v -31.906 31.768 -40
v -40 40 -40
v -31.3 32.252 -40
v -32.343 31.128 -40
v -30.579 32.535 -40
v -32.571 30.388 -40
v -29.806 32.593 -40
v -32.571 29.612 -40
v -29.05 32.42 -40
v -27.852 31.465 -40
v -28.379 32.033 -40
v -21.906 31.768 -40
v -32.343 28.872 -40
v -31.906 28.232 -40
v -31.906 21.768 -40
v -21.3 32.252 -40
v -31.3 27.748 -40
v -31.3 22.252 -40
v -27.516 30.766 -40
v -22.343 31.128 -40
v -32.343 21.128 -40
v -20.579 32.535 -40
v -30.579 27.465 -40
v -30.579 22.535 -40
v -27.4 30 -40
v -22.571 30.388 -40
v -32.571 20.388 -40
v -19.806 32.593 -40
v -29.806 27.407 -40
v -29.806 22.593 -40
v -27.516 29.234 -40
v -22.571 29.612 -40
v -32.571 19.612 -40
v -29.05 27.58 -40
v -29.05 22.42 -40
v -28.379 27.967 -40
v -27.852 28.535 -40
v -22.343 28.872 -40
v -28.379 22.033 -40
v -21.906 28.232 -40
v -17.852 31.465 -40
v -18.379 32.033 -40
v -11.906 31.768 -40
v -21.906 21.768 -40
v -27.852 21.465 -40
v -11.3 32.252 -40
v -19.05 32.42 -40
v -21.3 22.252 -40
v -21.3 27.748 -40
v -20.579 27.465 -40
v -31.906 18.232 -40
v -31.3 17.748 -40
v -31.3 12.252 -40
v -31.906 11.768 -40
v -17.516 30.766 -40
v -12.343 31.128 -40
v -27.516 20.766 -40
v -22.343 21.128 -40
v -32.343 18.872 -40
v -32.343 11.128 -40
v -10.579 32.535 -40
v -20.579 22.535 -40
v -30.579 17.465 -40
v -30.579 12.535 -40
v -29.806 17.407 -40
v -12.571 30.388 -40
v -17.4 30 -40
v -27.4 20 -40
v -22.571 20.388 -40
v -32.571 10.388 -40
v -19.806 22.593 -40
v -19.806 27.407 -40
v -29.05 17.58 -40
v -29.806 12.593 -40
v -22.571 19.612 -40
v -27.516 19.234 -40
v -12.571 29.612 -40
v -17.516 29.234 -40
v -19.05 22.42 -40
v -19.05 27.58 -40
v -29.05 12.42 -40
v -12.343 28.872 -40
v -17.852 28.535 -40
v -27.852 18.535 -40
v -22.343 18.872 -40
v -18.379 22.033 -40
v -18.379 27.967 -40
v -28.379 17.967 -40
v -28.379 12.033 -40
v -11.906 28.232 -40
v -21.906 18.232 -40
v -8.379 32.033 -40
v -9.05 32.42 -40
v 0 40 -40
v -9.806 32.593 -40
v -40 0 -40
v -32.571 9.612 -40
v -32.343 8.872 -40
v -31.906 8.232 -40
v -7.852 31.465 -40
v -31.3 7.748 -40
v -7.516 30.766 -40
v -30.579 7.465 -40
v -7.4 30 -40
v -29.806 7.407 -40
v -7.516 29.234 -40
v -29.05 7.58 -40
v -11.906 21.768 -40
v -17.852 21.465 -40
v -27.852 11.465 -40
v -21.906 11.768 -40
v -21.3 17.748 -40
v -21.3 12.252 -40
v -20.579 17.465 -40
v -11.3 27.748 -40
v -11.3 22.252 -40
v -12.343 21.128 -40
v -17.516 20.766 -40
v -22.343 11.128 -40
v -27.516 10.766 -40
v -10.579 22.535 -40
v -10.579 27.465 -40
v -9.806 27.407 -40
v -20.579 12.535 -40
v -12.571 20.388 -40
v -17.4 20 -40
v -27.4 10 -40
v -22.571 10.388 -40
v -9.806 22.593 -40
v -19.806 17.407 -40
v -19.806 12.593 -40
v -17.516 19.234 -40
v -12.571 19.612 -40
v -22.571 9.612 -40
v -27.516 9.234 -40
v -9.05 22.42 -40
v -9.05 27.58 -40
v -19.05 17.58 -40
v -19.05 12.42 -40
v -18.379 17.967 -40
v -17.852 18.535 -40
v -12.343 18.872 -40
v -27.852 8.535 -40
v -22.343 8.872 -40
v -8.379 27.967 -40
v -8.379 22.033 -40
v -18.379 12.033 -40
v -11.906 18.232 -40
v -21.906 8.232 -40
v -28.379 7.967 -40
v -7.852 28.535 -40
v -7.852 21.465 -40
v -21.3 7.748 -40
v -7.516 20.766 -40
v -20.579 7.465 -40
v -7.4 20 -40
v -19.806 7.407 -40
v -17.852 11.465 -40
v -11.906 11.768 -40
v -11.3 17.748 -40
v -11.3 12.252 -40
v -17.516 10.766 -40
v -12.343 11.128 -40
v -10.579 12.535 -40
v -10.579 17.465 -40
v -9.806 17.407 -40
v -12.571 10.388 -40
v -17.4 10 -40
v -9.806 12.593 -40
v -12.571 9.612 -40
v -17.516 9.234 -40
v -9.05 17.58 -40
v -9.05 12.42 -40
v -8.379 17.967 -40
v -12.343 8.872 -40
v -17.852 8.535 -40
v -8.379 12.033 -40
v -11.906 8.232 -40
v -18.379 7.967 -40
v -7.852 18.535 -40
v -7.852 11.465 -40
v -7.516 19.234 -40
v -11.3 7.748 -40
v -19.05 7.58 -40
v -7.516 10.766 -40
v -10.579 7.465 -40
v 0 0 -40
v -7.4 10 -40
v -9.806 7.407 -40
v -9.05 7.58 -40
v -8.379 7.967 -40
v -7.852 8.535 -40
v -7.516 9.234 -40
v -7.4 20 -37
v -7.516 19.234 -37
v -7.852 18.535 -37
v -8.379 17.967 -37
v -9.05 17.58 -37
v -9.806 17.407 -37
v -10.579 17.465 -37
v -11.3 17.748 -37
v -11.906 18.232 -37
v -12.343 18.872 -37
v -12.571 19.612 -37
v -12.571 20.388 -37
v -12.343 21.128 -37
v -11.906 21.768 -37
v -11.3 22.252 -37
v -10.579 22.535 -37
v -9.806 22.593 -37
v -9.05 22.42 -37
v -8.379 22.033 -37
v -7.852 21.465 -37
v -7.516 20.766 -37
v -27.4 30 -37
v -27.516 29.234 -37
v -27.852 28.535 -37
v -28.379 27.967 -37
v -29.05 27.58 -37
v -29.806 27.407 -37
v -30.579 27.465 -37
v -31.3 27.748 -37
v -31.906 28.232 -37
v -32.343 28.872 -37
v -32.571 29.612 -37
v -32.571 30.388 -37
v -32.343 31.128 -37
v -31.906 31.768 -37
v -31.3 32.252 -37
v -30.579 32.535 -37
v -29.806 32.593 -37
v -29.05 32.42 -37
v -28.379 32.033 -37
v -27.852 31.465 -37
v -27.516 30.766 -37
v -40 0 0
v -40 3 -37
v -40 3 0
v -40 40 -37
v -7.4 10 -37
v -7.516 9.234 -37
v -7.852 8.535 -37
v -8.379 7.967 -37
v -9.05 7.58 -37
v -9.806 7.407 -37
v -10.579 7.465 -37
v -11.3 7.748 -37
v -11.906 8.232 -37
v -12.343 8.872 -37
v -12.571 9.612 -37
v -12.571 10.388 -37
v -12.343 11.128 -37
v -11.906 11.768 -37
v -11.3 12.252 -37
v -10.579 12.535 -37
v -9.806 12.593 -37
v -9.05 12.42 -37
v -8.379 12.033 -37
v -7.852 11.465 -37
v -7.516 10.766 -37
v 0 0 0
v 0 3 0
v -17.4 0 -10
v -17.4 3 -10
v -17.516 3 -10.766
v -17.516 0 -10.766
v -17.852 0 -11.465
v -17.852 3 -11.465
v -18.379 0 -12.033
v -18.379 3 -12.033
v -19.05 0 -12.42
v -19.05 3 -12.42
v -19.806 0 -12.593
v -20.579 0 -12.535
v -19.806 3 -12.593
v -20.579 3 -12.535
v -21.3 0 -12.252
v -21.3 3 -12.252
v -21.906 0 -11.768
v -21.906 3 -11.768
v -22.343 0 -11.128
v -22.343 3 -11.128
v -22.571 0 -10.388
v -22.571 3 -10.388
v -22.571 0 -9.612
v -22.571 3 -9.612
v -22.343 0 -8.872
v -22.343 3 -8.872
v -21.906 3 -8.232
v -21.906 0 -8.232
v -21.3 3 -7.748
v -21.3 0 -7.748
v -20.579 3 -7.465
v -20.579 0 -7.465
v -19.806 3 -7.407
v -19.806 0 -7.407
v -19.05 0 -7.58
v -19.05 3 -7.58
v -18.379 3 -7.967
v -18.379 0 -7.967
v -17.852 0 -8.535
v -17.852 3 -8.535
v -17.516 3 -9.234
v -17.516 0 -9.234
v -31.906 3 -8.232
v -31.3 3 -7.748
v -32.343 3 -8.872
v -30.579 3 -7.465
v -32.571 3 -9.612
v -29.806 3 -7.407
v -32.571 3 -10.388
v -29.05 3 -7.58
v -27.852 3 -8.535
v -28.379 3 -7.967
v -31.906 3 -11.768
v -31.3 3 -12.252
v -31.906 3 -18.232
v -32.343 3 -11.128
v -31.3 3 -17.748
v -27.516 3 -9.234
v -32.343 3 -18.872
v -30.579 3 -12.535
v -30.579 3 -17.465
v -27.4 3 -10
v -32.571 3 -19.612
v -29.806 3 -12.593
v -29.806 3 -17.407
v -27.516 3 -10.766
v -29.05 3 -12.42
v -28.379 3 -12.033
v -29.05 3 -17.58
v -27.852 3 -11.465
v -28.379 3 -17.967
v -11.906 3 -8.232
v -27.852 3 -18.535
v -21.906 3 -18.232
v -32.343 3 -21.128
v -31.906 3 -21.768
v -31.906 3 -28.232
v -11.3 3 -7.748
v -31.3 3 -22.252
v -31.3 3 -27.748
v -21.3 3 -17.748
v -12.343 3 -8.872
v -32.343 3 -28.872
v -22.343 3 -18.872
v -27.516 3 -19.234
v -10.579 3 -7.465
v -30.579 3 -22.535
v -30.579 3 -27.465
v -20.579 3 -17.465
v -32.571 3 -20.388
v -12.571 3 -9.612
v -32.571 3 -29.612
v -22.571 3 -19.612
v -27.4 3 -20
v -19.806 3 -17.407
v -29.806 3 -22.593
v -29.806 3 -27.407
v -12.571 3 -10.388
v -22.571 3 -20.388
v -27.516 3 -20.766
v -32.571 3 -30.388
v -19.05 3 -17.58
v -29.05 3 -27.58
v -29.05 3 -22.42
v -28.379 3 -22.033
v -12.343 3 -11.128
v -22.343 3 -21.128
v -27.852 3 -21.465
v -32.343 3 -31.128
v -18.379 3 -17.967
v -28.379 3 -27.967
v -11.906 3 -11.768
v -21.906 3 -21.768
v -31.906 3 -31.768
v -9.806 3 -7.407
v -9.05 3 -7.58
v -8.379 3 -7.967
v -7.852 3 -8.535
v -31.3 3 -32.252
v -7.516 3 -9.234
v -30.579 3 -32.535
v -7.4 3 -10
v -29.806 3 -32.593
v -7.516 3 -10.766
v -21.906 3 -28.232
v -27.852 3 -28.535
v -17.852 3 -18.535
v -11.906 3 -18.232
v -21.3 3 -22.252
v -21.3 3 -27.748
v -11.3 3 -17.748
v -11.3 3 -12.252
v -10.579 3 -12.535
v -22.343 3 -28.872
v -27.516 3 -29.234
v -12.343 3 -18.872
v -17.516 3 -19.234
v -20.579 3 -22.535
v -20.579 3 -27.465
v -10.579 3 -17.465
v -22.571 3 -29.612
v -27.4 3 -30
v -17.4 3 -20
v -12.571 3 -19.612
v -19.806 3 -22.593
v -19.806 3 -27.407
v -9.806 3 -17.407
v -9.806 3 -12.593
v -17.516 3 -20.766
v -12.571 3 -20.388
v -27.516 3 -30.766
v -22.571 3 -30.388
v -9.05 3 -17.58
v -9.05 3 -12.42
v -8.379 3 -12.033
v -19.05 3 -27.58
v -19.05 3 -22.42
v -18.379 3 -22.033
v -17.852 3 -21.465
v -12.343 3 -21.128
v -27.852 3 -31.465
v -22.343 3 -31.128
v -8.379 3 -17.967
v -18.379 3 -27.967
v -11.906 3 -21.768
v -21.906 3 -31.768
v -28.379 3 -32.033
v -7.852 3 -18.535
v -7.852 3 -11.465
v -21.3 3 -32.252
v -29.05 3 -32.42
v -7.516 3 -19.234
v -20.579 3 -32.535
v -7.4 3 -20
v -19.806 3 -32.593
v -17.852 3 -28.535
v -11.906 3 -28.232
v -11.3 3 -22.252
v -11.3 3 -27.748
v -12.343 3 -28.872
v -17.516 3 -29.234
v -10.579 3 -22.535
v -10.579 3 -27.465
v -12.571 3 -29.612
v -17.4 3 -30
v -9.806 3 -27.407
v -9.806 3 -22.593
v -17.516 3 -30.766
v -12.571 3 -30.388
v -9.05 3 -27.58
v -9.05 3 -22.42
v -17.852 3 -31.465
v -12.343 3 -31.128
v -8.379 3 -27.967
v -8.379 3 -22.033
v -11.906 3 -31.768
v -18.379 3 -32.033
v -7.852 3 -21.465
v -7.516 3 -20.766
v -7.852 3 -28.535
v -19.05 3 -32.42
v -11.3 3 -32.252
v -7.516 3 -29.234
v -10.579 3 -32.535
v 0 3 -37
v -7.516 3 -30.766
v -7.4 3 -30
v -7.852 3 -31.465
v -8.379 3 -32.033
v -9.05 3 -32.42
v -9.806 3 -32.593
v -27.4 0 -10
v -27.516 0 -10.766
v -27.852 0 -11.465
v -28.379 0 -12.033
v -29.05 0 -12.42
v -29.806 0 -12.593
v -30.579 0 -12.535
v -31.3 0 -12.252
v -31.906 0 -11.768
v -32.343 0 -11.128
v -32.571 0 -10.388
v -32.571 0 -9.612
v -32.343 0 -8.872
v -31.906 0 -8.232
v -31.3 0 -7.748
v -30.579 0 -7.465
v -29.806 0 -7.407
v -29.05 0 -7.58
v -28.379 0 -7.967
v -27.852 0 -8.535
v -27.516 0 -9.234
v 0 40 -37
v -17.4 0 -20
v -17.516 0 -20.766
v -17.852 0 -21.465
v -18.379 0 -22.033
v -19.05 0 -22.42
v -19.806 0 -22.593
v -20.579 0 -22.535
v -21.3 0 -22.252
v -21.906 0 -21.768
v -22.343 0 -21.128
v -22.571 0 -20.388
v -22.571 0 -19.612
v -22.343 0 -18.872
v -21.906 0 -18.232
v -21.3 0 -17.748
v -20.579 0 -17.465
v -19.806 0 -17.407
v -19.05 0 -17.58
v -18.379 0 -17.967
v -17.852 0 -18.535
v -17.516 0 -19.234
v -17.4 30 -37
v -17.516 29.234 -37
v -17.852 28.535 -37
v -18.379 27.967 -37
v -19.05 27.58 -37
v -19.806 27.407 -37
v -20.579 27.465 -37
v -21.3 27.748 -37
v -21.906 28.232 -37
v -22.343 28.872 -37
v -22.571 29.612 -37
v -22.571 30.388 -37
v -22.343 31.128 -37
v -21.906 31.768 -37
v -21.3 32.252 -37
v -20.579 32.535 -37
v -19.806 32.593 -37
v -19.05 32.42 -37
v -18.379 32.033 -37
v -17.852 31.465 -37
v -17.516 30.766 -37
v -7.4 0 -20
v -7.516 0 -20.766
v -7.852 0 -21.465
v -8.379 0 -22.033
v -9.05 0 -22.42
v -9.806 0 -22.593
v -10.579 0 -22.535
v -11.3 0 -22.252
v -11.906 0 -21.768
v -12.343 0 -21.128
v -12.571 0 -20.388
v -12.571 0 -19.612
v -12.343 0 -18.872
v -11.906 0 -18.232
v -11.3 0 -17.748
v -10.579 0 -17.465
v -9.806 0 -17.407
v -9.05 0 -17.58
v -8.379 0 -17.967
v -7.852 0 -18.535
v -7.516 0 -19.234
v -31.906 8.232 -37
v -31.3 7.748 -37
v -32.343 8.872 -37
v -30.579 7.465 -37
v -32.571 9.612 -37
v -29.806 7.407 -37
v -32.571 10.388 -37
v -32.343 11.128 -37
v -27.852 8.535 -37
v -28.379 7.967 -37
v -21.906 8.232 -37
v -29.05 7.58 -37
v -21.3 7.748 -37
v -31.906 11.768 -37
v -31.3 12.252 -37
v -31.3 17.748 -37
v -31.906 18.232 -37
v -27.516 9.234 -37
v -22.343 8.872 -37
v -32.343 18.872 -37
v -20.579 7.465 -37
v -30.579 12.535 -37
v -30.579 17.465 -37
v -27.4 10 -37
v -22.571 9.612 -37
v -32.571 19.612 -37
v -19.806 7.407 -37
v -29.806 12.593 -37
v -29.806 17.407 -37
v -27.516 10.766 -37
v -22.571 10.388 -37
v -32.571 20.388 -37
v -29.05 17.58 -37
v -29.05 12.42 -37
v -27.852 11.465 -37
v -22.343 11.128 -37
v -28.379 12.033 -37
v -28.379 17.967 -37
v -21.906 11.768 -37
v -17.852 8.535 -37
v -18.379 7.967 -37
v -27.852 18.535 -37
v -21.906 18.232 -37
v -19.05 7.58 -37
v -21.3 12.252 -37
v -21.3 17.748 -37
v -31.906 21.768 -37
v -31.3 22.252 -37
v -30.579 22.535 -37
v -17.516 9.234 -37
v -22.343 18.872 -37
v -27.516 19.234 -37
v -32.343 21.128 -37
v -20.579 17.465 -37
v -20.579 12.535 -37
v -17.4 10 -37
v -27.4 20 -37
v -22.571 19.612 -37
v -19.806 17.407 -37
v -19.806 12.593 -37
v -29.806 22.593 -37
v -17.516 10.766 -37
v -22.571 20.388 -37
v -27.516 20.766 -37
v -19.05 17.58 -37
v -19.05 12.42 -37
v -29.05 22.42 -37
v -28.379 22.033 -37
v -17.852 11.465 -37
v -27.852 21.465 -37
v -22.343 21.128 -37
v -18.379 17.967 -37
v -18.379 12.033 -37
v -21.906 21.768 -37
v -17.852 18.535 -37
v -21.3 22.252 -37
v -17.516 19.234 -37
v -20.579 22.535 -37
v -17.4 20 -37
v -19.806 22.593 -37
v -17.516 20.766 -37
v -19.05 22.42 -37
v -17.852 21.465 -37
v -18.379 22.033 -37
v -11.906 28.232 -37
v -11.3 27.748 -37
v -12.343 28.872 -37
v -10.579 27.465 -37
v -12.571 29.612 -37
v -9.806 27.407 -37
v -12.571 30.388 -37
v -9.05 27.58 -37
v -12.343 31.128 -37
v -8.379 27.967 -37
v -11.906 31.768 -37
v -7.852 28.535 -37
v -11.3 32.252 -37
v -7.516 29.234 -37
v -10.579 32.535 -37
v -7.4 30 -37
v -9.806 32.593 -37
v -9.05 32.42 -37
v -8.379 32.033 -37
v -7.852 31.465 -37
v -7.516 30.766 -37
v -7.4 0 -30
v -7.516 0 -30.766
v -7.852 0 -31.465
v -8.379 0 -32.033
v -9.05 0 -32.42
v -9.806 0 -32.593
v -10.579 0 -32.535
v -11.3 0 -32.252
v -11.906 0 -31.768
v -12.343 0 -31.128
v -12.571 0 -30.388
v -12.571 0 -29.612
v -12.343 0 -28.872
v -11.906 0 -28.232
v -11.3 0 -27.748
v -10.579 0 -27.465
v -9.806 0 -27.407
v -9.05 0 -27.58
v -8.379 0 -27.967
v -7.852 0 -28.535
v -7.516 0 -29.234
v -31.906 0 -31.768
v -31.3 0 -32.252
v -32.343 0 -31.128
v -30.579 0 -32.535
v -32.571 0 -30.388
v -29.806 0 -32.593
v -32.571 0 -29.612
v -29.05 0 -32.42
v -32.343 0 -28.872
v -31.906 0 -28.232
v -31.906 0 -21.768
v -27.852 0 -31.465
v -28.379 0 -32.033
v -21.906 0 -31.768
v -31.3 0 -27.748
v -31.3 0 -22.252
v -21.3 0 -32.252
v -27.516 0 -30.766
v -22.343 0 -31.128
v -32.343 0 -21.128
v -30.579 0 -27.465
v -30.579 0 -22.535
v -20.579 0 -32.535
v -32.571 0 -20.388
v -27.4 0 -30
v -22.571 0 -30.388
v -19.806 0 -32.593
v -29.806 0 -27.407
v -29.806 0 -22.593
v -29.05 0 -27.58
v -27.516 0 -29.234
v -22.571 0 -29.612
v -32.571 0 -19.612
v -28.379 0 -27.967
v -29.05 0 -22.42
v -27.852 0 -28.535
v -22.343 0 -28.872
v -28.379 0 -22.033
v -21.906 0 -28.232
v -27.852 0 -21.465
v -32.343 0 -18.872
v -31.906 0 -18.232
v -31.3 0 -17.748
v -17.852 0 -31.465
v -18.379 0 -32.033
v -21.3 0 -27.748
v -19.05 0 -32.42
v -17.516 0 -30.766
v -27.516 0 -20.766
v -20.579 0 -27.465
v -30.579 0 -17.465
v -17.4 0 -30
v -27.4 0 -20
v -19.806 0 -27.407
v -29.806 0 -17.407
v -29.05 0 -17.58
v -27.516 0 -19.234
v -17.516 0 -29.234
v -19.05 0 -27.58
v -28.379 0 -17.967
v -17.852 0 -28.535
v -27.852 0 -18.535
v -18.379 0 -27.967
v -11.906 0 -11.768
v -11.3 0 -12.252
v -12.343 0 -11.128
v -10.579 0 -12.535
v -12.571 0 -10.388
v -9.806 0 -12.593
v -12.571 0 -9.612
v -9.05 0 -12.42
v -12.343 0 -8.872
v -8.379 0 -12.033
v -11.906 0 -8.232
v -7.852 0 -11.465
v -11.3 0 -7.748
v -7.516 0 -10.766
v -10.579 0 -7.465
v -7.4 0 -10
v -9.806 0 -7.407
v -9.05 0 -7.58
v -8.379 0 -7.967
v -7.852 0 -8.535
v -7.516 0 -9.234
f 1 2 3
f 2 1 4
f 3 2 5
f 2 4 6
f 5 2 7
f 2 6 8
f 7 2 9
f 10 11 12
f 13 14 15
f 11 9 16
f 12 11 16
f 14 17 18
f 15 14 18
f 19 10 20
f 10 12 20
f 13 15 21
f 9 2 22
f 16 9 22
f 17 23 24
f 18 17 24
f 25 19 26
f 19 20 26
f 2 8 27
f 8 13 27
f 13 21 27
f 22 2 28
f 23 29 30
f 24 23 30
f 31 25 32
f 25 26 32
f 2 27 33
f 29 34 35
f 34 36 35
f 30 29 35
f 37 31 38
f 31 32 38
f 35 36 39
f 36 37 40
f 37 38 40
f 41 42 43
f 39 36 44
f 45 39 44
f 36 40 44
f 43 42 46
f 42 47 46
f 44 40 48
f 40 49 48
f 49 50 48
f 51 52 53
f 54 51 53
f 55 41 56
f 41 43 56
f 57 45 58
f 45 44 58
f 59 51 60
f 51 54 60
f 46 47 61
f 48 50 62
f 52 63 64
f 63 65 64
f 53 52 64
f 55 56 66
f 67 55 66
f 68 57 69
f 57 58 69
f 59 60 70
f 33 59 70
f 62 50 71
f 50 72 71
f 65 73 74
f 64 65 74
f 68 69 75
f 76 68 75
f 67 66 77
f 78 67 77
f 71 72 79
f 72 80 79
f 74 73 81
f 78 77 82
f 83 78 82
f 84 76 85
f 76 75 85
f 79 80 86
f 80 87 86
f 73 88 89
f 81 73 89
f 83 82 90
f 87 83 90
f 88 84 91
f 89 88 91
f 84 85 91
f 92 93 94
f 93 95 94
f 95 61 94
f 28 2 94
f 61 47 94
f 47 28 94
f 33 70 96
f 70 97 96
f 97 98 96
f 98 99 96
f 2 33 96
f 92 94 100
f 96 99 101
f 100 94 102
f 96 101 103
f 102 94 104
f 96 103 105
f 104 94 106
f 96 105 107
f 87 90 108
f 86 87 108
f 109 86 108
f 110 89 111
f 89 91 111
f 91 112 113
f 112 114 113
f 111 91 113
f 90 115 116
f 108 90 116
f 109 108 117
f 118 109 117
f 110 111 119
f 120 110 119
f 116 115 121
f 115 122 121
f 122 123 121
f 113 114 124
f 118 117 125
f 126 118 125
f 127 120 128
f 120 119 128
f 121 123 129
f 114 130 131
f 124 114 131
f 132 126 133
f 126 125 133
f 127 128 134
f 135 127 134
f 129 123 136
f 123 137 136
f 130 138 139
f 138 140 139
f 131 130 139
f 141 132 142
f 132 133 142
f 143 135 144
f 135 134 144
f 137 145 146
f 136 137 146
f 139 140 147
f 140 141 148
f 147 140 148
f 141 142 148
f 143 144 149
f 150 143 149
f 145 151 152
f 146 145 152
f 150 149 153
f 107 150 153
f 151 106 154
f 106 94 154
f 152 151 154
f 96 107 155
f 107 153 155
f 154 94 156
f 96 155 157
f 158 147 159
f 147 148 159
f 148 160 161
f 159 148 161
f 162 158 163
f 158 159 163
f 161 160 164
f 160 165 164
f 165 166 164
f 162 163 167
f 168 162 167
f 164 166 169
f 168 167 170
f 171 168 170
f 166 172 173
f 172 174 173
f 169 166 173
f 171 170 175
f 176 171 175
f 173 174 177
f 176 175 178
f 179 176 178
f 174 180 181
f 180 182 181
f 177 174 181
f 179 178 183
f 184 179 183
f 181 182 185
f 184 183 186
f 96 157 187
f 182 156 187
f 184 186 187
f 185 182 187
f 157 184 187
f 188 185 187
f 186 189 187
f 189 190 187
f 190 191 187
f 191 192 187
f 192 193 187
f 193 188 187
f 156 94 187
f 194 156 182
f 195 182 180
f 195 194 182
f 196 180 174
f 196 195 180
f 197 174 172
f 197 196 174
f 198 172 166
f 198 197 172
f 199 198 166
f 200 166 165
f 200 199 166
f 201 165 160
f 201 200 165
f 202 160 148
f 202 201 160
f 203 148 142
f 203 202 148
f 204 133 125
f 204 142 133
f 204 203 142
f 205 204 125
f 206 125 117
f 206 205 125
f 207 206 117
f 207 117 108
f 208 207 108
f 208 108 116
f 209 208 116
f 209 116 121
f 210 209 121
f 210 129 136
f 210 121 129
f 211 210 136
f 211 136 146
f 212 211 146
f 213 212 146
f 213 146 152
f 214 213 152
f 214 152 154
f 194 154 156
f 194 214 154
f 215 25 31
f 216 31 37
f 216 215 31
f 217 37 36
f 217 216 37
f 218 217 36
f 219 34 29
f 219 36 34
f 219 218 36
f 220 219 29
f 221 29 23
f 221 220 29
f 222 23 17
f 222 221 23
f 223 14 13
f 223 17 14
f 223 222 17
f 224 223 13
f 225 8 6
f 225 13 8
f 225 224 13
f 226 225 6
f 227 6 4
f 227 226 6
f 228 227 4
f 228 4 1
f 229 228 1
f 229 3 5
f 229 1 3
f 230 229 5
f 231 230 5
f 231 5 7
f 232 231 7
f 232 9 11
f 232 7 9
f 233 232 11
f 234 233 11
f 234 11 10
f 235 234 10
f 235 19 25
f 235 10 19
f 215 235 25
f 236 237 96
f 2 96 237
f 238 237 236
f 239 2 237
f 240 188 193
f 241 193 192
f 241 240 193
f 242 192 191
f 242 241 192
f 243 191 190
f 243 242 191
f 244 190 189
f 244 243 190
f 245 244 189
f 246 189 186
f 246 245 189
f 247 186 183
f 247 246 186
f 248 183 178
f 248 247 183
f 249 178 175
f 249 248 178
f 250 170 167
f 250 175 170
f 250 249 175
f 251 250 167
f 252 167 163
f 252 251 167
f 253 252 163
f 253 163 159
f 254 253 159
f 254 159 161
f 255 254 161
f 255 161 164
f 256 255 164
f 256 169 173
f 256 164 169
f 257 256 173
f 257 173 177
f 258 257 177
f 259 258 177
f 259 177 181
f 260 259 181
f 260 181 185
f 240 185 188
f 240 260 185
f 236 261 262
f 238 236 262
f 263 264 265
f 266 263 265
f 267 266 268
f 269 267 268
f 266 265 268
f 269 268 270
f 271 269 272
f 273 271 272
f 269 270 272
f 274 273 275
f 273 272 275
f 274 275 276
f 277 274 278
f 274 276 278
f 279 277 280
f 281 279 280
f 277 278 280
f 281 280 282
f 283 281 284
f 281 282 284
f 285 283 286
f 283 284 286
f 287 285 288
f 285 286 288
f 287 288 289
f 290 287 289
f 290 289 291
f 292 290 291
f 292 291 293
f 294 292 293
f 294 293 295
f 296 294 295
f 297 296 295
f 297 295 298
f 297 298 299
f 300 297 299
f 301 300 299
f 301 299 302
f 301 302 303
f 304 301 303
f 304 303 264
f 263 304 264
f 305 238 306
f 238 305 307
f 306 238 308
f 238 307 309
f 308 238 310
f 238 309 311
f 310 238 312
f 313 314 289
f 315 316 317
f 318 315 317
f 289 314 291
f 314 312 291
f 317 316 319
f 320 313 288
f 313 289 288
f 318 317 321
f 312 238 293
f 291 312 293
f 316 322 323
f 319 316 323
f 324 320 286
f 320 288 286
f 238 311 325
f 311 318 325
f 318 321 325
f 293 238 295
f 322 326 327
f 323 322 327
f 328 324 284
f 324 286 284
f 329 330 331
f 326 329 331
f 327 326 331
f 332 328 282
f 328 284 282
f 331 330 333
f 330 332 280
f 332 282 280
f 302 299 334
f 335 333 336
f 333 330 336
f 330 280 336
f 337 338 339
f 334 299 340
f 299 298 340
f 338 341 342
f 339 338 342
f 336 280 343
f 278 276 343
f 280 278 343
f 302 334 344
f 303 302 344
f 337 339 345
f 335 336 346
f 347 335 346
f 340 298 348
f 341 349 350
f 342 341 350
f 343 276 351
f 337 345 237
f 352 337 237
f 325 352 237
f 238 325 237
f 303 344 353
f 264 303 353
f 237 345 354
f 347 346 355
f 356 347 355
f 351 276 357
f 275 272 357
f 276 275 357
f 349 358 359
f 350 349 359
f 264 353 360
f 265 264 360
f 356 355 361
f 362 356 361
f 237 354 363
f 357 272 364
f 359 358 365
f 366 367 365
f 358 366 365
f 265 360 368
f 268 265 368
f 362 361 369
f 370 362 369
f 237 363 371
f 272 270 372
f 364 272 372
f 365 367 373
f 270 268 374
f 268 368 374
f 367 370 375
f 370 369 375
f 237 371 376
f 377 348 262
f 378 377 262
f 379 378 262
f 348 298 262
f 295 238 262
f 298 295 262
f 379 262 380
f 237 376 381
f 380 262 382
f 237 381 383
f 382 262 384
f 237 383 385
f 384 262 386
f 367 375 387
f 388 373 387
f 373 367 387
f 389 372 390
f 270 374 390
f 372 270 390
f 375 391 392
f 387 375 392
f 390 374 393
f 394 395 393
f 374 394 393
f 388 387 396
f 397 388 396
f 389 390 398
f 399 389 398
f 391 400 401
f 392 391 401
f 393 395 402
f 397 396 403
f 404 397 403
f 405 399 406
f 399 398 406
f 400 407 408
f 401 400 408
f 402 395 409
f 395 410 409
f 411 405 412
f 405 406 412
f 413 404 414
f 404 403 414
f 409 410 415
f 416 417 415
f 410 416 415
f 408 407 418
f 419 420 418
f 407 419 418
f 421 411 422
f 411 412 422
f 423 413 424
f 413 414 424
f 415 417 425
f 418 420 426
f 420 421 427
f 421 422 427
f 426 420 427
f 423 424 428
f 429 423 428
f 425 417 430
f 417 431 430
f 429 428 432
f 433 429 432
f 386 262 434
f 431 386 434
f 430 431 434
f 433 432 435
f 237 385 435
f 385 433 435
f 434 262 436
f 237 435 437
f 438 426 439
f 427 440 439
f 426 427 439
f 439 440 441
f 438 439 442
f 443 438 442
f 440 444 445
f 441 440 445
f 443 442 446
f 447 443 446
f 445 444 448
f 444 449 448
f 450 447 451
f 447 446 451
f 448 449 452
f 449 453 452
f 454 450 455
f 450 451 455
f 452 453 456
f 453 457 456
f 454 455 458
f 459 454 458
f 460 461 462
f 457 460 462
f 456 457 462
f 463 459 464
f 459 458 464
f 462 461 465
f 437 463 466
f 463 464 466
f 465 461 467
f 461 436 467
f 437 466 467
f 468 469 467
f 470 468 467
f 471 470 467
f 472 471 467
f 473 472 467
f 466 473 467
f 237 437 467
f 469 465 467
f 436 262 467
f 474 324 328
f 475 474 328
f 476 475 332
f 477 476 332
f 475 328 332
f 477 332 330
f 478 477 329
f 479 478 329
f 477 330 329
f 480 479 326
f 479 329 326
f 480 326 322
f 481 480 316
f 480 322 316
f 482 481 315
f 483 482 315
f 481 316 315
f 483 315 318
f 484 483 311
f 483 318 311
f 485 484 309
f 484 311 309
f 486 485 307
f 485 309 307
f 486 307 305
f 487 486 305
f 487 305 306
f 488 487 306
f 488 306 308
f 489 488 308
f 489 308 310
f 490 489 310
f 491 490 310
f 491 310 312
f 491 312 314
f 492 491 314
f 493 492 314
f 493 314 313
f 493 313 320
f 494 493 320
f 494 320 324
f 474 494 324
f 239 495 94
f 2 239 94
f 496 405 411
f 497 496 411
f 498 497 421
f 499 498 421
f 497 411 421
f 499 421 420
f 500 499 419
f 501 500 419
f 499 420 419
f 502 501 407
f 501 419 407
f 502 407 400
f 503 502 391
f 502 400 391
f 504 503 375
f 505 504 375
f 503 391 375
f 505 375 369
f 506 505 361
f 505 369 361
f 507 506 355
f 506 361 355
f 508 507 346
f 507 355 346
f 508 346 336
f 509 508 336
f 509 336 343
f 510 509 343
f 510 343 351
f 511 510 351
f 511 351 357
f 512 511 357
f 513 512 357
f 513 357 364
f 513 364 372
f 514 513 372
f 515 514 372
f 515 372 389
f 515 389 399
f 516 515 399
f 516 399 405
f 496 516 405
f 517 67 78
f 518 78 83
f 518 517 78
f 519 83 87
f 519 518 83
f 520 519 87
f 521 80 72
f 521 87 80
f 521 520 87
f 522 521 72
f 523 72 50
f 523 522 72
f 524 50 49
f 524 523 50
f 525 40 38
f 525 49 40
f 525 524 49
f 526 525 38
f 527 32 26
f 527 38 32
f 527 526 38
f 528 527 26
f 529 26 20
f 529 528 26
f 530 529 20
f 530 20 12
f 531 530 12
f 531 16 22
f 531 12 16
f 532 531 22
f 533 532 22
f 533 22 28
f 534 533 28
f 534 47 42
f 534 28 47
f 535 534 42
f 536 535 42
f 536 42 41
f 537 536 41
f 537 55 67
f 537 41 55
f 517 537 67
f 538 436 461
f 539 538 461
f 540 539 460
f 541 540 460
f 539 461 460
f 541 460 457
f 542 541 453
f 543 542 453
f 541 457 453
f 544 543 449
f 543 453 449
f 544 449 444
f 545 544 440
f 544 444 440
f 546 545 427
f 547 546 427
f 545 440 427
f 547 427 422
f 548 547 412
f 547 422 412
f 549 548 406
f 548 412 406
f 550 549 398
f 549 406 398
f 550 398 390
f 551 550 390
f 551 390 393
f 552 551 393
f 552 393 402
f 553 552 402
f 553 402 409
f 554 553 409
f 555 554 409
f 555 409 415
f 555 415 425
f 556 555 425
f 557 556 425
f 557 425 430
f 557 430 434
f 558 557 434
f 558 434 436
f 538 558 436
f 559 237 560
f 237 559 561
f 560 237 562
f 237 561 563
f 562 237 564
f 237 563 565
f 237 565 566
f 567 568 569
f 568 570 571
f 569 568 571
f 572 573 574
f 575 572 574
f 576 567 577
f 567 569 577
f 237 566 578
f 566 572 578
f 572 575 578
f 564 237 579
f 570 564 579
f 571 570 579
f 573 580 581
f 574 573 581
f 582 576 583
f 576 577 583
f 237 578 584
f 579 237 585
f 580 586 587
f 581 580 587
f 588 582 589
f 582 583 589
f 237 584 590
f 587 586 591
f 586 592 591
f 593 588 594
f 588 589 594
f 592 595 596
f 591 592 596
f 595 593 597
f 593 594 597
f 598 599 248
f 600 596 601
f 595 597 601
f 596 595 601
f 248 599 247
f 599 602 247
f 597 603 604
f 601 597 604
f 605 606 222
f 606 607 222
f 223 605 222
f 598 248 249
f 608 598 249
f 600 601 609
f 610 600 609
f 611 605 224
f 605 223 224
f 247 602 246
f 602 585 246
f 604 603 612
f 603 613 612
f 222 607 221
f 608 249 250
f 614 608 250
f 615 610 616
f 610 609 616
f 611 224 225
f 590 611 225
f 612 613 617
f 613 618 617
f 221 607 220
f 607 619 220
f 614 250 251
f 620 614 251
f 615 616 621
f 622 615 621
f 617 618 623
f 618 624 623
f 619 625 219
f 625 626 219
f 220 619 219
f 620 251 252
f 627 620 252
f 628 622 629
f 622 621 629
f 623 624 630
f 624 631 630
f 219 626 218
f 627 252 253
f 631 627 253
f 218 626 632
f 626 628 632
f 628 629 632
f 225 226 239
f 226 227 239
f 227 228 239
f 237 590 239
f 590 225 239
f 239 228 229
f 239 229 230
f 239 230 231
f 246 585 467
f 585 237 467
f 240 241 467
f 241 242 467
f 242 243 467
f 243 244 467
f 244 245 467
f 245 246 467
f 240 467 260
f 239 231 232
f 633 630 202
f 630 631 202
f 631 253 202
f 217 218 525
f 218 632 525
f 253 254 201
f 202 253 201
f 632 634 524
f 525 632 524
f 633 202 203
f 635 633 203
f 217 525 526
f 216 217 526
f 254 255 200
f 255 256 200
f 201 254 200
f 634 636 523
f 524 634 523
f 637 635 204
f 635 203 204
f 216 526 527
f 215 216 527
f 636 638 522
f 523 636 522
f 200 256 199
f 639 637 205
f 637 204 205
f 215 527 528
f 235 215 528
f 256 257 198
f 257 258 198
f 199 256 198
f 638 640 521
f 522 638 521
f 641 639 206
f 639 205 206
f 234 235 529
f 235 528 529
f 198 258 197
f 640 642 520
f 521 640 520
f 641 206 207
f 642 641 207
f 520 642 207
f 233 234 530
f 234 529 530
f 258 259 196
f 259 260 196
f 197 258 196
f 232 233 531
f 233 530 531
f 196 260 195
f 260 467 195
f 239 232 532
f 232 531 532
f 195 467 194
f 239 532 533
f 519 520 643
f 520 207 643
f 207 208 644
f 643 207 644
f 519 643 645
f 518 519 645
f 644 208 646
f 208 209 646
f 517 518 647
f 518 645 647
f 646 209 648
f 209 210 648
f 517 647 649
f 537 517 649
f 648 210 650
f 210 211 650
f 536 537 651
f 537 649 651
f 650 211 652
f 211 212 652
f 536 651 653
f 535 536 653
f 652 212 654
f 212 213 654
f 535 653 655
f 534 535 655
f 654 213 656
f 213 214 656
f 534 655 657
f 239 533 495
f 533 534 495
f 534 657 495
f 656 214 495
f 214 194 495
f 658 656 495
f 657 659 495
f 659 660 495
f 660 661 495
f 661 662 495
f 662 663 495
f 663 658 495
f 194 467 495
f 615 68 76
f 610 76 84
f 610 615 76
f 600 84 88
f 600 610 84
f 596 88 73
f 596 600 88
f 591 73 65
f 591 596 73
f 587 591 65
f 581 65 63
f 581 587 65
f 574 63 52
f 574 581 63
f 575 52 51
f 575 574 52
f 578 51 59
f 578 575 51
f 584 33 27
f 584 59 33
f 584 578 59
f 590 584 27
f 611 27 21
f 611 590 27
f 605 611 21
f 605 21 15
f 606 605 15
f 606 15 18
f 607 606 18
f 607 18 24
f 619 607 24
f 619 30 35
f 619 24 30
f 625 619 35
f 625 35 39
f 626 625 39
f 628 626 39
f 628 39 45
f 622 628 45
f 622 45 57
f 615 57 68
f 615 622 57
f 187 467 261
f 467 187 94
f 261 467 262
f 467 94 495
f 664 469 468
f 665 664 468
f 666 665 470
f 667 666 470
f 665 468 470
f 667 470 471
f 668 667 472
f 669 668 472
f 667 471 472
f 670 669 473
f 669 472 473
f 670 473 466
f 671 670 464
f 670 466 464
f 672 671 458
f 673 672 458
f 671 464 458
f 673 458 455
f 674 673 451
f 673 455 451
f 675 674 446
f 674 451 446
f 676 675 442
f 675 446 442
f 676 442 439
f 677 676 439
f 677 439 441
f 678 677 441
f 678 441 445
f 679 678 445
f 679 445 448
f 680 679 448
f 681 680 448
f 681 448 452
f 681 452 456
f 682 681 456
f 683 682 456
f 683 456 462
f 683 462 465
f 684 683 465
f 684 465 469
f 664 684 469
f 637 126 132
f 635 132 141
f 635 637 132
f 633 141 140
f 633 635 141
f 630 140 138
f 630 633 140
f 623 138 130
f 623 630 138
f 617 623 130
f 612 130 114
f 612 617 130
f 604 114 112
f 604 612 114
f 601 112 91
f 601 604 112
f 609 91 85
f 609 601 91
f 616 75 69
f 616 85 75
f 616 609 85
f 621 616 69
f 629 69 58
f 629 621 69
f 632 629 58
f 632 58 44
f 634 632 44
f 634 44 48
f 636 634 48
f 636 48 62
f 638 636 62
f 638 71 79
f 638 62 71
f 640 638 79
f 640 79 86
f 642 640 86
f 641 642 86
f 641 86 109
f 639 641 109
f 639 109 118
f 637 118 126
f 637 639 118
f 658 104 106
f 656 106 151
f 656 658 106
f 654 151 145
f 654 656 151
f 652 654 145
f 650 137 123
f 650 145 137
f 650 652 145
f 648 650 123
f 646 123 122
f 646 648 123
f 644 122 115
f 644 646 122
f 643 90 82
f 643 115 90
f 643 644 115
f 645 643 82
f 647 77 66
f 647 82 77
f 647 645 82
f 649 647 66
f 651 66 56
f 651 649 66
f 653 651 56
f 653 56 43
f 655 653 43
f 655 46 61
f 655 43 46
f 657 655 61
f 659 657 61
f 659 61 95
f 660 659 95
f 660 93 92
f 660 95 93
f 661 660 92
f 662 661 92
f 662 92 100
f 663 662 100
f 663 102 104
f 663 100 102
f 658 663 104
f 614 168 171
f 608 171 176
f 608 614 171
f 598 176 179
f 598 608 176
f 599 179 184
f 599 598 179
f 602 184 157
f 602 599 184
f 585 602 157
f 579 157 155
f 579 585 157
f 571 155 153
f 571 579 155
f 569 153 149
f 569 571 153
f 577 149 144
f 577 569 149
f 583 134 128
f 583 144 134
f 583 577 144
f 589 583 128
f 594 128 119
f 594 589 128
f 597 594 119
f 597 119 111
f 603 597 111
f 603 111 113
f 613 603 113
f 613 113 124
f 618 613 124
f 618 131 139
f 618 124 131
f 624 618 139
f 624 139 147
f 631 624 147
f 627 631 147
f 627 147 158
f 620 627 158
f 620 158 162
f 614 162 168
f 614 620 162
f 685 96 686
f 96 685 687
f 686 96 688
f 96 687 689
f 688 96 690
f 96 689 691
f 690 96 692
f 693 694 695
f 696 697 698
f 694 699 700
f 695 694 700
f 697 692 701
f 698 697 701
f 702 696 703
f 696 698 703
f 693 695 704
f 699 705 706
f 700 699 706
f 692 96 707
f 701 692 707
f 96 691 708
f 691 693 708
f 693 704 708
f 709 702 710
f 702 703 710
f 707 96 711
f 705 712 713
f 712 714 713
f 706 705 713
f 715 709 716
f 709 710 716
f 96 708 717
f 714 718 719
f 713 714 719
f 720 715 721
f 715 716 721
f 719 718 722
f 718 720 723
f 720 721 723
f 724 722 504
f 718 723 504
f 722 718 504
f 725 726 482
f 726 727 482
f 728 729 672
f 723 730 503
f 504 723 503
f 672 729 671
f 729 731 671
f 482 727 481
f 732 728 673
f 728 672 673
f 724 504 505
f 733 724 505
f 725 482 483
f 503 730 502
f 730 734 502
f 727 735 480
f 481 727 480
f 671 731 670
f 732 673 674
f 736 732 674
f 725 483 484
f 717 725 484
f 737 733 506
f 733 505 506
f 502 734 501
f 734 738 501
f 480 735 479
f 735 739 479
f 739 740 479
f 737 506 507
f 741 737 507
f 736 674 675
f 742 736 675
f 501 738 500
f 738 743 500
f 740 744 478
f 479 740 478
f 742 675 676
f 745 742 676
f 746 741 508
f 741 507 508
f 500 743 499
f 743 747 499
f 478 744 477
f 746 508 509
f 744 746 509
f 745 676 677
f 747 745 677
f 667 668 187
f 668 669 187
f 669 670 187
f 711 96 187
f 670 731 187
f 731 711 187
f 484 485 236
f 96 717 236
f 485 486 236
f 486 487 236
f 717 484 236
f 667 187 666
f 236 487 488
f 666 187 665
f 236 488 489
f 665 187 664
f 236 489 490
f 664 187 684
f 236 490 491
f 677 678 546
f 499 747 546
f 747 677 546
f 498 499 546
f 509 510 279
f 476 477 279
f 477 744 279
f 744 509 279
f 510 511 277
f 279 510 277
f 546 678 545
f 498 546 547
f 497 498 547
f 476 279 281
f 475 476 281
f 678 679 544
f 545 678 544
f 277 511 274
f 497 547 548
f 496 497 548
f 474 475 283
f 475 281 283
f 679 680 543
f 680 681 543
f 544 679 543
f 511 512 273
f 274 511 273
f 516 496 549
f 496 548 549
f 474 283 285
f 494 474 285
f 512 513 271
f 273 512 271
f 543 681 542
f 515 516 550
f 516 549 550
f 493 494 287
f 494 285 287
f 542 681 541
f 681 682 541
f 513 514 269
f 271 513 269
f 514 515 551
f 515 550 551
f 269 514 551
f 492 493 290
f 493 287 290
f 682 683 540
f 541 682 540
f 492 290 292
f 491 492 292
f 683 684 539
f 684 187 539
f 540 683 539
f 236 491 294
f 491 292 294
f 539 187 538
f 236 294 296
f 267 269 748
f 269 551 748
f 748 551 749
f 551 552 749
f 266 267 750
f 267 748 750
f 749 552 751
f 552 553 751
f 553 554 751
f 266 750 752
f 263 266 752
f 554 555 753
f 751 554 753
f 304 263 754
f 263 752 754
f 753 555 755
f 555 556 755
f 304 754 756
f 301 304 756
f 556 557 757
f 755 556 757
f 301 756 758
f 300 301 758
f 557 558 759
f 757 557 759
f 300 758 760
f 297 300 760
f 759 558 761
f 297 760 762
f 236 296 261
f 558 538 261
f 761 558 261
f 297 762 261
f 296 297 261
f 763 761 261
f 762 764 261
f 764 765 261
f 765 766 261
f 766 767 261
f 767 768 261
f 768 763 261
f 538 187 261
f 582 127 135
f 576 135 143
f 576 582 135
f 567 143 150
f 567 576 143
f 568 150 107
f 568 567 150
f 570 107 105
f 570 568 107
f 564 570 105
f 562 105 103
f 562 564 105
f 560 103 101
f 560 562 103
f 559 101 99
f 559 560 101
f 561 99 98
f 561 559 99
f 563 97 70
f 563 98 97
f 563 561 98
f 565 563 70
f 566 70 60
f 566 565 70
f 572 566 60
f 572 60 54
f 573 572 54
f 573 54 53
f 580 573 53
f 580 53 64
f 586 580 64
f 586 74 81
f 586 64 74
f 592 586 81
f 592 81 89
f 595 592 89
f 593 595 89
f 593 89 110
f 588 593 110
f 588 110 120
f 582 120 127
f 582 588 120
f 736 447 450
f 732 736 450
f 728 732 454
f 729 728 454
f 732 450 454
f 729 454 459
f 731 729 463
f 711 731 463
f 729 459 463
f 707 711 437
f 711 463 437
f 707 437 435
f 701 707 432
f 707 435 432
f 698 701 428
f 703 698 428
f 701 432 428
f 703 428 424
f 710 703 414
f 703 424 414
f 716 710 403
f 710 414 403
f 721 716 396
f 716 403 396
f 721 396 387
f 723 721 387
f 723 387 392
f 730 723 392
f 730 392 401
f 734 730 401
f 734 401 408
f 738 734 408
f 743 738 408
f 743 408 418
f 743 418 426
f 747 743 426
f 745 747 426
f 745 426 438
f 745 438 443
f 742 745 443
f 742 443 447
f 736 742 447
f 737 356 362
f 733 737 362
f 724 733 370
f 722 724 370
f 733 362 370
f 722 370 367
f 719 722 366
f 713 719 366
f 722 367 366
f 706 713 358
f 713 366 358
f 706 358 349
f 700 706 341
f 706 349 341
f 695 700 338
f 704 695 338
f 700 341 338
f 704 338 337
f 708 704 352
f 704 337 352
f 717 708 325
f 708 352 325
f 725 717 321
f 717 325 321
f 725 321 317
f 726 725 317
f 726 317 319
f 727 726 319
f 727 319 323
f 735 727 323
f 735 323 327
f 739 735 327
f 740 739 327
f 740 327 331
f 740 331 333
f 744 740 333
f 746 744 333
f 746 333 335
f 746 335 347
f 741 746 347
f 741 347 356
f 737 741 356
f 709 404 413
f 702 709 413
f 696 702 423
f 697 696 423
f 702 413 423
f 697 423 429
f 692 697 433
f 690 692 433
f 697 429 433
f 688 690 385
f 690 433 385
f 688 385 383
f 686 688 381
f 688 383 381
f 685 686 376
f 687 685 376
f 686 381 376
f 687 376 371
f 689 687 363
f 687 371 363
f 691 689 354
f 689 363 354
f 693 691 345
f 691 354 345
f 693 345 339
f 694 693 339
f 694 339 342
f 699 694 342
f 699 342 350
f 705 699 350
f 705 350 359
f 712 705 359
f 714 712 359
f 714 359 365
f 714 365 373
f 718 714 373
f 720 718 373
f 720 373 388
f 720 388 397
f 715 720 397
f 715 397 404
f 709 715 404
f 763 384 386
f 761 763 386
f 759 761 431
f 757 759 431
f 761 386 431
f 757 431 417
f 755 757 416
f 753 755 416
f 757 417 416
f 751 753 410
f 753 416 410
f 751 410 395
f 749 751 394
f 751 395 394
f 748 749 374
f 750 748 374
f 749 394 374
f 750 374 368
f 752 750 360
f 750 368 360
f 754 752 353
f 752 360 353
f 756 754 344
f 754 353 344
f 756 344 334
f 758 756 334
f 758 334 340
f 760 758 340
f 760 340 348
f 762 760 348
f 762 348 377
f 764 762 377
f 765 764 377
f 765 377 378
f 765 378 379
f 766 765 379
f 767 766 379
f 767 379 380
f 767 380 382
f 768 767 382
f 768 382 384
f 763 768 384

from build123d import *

# Parameters (mm, degrees)
BOSS_EXTRUDE1_DEPTH = 40
SKETCH2_R           = 2.6
CUT_EXTRUDE1_DEPTH  = 4


with BuildPart() as part:
    # Sketch1 → Boss-Extrude1 (new body)
    with BuildSketch(Plane(origin=(0, 0, 0), x_dir=(0, 0, -1), z_dir=(1, 0, 0))):
        Polygon((0, 0), (0, 3), (37, 3), (37, 40), (40, 40), (40, 0), align=None)
    extrude(amount=-BOSS_EXTRUDE1_DEPTH)

    # Sketch2 → Cut-Extrude1 (cut, through all)
    with BuildSketch(Plane(origin=(0, 3, 0), x_dir=(1, 0, 0), z_dir=(0, 1, 0))):
        with Locations((-30, 10)):
            Circle(SKETCH2_R)
        with Locations((-20, 10)):
            Circle(SKETCH2_R)
        with Locations((-10, 10)):
            Circle(SKETCH2_R)
        with Locations((-20, 20)):
            Circle(SKETCH2_R)
        with Locations((-10, 20)):
            Circle(SKETCH2_R)
        with Locations((-20, 30)):
            Circle(SKETCH2_R)
        with Locations((-10, 30)):
            Circle(SKETCH2_R)
        with Locations((-30, 20)):
            Circle(SKETCH2_R)
        with Locations((-30, 30)):
            Circle(SKETCH2_R)
    cut_extrude1 = extrude(amount=-CUT_EXTRUDE1_DEPTH, mode=Mode.SUBTRACT)

    # Mirror1: Cut-Extrude1 across plane
    add(cut_extrude1.mirror(Plane(origin=(0, 20, -20), x_dir=(0, 0.707106781, 0.707106781), z_dir=(0, 0.707106781, -0.707106781))), mode=Mode.SUBTRACT)


solid = part.part
